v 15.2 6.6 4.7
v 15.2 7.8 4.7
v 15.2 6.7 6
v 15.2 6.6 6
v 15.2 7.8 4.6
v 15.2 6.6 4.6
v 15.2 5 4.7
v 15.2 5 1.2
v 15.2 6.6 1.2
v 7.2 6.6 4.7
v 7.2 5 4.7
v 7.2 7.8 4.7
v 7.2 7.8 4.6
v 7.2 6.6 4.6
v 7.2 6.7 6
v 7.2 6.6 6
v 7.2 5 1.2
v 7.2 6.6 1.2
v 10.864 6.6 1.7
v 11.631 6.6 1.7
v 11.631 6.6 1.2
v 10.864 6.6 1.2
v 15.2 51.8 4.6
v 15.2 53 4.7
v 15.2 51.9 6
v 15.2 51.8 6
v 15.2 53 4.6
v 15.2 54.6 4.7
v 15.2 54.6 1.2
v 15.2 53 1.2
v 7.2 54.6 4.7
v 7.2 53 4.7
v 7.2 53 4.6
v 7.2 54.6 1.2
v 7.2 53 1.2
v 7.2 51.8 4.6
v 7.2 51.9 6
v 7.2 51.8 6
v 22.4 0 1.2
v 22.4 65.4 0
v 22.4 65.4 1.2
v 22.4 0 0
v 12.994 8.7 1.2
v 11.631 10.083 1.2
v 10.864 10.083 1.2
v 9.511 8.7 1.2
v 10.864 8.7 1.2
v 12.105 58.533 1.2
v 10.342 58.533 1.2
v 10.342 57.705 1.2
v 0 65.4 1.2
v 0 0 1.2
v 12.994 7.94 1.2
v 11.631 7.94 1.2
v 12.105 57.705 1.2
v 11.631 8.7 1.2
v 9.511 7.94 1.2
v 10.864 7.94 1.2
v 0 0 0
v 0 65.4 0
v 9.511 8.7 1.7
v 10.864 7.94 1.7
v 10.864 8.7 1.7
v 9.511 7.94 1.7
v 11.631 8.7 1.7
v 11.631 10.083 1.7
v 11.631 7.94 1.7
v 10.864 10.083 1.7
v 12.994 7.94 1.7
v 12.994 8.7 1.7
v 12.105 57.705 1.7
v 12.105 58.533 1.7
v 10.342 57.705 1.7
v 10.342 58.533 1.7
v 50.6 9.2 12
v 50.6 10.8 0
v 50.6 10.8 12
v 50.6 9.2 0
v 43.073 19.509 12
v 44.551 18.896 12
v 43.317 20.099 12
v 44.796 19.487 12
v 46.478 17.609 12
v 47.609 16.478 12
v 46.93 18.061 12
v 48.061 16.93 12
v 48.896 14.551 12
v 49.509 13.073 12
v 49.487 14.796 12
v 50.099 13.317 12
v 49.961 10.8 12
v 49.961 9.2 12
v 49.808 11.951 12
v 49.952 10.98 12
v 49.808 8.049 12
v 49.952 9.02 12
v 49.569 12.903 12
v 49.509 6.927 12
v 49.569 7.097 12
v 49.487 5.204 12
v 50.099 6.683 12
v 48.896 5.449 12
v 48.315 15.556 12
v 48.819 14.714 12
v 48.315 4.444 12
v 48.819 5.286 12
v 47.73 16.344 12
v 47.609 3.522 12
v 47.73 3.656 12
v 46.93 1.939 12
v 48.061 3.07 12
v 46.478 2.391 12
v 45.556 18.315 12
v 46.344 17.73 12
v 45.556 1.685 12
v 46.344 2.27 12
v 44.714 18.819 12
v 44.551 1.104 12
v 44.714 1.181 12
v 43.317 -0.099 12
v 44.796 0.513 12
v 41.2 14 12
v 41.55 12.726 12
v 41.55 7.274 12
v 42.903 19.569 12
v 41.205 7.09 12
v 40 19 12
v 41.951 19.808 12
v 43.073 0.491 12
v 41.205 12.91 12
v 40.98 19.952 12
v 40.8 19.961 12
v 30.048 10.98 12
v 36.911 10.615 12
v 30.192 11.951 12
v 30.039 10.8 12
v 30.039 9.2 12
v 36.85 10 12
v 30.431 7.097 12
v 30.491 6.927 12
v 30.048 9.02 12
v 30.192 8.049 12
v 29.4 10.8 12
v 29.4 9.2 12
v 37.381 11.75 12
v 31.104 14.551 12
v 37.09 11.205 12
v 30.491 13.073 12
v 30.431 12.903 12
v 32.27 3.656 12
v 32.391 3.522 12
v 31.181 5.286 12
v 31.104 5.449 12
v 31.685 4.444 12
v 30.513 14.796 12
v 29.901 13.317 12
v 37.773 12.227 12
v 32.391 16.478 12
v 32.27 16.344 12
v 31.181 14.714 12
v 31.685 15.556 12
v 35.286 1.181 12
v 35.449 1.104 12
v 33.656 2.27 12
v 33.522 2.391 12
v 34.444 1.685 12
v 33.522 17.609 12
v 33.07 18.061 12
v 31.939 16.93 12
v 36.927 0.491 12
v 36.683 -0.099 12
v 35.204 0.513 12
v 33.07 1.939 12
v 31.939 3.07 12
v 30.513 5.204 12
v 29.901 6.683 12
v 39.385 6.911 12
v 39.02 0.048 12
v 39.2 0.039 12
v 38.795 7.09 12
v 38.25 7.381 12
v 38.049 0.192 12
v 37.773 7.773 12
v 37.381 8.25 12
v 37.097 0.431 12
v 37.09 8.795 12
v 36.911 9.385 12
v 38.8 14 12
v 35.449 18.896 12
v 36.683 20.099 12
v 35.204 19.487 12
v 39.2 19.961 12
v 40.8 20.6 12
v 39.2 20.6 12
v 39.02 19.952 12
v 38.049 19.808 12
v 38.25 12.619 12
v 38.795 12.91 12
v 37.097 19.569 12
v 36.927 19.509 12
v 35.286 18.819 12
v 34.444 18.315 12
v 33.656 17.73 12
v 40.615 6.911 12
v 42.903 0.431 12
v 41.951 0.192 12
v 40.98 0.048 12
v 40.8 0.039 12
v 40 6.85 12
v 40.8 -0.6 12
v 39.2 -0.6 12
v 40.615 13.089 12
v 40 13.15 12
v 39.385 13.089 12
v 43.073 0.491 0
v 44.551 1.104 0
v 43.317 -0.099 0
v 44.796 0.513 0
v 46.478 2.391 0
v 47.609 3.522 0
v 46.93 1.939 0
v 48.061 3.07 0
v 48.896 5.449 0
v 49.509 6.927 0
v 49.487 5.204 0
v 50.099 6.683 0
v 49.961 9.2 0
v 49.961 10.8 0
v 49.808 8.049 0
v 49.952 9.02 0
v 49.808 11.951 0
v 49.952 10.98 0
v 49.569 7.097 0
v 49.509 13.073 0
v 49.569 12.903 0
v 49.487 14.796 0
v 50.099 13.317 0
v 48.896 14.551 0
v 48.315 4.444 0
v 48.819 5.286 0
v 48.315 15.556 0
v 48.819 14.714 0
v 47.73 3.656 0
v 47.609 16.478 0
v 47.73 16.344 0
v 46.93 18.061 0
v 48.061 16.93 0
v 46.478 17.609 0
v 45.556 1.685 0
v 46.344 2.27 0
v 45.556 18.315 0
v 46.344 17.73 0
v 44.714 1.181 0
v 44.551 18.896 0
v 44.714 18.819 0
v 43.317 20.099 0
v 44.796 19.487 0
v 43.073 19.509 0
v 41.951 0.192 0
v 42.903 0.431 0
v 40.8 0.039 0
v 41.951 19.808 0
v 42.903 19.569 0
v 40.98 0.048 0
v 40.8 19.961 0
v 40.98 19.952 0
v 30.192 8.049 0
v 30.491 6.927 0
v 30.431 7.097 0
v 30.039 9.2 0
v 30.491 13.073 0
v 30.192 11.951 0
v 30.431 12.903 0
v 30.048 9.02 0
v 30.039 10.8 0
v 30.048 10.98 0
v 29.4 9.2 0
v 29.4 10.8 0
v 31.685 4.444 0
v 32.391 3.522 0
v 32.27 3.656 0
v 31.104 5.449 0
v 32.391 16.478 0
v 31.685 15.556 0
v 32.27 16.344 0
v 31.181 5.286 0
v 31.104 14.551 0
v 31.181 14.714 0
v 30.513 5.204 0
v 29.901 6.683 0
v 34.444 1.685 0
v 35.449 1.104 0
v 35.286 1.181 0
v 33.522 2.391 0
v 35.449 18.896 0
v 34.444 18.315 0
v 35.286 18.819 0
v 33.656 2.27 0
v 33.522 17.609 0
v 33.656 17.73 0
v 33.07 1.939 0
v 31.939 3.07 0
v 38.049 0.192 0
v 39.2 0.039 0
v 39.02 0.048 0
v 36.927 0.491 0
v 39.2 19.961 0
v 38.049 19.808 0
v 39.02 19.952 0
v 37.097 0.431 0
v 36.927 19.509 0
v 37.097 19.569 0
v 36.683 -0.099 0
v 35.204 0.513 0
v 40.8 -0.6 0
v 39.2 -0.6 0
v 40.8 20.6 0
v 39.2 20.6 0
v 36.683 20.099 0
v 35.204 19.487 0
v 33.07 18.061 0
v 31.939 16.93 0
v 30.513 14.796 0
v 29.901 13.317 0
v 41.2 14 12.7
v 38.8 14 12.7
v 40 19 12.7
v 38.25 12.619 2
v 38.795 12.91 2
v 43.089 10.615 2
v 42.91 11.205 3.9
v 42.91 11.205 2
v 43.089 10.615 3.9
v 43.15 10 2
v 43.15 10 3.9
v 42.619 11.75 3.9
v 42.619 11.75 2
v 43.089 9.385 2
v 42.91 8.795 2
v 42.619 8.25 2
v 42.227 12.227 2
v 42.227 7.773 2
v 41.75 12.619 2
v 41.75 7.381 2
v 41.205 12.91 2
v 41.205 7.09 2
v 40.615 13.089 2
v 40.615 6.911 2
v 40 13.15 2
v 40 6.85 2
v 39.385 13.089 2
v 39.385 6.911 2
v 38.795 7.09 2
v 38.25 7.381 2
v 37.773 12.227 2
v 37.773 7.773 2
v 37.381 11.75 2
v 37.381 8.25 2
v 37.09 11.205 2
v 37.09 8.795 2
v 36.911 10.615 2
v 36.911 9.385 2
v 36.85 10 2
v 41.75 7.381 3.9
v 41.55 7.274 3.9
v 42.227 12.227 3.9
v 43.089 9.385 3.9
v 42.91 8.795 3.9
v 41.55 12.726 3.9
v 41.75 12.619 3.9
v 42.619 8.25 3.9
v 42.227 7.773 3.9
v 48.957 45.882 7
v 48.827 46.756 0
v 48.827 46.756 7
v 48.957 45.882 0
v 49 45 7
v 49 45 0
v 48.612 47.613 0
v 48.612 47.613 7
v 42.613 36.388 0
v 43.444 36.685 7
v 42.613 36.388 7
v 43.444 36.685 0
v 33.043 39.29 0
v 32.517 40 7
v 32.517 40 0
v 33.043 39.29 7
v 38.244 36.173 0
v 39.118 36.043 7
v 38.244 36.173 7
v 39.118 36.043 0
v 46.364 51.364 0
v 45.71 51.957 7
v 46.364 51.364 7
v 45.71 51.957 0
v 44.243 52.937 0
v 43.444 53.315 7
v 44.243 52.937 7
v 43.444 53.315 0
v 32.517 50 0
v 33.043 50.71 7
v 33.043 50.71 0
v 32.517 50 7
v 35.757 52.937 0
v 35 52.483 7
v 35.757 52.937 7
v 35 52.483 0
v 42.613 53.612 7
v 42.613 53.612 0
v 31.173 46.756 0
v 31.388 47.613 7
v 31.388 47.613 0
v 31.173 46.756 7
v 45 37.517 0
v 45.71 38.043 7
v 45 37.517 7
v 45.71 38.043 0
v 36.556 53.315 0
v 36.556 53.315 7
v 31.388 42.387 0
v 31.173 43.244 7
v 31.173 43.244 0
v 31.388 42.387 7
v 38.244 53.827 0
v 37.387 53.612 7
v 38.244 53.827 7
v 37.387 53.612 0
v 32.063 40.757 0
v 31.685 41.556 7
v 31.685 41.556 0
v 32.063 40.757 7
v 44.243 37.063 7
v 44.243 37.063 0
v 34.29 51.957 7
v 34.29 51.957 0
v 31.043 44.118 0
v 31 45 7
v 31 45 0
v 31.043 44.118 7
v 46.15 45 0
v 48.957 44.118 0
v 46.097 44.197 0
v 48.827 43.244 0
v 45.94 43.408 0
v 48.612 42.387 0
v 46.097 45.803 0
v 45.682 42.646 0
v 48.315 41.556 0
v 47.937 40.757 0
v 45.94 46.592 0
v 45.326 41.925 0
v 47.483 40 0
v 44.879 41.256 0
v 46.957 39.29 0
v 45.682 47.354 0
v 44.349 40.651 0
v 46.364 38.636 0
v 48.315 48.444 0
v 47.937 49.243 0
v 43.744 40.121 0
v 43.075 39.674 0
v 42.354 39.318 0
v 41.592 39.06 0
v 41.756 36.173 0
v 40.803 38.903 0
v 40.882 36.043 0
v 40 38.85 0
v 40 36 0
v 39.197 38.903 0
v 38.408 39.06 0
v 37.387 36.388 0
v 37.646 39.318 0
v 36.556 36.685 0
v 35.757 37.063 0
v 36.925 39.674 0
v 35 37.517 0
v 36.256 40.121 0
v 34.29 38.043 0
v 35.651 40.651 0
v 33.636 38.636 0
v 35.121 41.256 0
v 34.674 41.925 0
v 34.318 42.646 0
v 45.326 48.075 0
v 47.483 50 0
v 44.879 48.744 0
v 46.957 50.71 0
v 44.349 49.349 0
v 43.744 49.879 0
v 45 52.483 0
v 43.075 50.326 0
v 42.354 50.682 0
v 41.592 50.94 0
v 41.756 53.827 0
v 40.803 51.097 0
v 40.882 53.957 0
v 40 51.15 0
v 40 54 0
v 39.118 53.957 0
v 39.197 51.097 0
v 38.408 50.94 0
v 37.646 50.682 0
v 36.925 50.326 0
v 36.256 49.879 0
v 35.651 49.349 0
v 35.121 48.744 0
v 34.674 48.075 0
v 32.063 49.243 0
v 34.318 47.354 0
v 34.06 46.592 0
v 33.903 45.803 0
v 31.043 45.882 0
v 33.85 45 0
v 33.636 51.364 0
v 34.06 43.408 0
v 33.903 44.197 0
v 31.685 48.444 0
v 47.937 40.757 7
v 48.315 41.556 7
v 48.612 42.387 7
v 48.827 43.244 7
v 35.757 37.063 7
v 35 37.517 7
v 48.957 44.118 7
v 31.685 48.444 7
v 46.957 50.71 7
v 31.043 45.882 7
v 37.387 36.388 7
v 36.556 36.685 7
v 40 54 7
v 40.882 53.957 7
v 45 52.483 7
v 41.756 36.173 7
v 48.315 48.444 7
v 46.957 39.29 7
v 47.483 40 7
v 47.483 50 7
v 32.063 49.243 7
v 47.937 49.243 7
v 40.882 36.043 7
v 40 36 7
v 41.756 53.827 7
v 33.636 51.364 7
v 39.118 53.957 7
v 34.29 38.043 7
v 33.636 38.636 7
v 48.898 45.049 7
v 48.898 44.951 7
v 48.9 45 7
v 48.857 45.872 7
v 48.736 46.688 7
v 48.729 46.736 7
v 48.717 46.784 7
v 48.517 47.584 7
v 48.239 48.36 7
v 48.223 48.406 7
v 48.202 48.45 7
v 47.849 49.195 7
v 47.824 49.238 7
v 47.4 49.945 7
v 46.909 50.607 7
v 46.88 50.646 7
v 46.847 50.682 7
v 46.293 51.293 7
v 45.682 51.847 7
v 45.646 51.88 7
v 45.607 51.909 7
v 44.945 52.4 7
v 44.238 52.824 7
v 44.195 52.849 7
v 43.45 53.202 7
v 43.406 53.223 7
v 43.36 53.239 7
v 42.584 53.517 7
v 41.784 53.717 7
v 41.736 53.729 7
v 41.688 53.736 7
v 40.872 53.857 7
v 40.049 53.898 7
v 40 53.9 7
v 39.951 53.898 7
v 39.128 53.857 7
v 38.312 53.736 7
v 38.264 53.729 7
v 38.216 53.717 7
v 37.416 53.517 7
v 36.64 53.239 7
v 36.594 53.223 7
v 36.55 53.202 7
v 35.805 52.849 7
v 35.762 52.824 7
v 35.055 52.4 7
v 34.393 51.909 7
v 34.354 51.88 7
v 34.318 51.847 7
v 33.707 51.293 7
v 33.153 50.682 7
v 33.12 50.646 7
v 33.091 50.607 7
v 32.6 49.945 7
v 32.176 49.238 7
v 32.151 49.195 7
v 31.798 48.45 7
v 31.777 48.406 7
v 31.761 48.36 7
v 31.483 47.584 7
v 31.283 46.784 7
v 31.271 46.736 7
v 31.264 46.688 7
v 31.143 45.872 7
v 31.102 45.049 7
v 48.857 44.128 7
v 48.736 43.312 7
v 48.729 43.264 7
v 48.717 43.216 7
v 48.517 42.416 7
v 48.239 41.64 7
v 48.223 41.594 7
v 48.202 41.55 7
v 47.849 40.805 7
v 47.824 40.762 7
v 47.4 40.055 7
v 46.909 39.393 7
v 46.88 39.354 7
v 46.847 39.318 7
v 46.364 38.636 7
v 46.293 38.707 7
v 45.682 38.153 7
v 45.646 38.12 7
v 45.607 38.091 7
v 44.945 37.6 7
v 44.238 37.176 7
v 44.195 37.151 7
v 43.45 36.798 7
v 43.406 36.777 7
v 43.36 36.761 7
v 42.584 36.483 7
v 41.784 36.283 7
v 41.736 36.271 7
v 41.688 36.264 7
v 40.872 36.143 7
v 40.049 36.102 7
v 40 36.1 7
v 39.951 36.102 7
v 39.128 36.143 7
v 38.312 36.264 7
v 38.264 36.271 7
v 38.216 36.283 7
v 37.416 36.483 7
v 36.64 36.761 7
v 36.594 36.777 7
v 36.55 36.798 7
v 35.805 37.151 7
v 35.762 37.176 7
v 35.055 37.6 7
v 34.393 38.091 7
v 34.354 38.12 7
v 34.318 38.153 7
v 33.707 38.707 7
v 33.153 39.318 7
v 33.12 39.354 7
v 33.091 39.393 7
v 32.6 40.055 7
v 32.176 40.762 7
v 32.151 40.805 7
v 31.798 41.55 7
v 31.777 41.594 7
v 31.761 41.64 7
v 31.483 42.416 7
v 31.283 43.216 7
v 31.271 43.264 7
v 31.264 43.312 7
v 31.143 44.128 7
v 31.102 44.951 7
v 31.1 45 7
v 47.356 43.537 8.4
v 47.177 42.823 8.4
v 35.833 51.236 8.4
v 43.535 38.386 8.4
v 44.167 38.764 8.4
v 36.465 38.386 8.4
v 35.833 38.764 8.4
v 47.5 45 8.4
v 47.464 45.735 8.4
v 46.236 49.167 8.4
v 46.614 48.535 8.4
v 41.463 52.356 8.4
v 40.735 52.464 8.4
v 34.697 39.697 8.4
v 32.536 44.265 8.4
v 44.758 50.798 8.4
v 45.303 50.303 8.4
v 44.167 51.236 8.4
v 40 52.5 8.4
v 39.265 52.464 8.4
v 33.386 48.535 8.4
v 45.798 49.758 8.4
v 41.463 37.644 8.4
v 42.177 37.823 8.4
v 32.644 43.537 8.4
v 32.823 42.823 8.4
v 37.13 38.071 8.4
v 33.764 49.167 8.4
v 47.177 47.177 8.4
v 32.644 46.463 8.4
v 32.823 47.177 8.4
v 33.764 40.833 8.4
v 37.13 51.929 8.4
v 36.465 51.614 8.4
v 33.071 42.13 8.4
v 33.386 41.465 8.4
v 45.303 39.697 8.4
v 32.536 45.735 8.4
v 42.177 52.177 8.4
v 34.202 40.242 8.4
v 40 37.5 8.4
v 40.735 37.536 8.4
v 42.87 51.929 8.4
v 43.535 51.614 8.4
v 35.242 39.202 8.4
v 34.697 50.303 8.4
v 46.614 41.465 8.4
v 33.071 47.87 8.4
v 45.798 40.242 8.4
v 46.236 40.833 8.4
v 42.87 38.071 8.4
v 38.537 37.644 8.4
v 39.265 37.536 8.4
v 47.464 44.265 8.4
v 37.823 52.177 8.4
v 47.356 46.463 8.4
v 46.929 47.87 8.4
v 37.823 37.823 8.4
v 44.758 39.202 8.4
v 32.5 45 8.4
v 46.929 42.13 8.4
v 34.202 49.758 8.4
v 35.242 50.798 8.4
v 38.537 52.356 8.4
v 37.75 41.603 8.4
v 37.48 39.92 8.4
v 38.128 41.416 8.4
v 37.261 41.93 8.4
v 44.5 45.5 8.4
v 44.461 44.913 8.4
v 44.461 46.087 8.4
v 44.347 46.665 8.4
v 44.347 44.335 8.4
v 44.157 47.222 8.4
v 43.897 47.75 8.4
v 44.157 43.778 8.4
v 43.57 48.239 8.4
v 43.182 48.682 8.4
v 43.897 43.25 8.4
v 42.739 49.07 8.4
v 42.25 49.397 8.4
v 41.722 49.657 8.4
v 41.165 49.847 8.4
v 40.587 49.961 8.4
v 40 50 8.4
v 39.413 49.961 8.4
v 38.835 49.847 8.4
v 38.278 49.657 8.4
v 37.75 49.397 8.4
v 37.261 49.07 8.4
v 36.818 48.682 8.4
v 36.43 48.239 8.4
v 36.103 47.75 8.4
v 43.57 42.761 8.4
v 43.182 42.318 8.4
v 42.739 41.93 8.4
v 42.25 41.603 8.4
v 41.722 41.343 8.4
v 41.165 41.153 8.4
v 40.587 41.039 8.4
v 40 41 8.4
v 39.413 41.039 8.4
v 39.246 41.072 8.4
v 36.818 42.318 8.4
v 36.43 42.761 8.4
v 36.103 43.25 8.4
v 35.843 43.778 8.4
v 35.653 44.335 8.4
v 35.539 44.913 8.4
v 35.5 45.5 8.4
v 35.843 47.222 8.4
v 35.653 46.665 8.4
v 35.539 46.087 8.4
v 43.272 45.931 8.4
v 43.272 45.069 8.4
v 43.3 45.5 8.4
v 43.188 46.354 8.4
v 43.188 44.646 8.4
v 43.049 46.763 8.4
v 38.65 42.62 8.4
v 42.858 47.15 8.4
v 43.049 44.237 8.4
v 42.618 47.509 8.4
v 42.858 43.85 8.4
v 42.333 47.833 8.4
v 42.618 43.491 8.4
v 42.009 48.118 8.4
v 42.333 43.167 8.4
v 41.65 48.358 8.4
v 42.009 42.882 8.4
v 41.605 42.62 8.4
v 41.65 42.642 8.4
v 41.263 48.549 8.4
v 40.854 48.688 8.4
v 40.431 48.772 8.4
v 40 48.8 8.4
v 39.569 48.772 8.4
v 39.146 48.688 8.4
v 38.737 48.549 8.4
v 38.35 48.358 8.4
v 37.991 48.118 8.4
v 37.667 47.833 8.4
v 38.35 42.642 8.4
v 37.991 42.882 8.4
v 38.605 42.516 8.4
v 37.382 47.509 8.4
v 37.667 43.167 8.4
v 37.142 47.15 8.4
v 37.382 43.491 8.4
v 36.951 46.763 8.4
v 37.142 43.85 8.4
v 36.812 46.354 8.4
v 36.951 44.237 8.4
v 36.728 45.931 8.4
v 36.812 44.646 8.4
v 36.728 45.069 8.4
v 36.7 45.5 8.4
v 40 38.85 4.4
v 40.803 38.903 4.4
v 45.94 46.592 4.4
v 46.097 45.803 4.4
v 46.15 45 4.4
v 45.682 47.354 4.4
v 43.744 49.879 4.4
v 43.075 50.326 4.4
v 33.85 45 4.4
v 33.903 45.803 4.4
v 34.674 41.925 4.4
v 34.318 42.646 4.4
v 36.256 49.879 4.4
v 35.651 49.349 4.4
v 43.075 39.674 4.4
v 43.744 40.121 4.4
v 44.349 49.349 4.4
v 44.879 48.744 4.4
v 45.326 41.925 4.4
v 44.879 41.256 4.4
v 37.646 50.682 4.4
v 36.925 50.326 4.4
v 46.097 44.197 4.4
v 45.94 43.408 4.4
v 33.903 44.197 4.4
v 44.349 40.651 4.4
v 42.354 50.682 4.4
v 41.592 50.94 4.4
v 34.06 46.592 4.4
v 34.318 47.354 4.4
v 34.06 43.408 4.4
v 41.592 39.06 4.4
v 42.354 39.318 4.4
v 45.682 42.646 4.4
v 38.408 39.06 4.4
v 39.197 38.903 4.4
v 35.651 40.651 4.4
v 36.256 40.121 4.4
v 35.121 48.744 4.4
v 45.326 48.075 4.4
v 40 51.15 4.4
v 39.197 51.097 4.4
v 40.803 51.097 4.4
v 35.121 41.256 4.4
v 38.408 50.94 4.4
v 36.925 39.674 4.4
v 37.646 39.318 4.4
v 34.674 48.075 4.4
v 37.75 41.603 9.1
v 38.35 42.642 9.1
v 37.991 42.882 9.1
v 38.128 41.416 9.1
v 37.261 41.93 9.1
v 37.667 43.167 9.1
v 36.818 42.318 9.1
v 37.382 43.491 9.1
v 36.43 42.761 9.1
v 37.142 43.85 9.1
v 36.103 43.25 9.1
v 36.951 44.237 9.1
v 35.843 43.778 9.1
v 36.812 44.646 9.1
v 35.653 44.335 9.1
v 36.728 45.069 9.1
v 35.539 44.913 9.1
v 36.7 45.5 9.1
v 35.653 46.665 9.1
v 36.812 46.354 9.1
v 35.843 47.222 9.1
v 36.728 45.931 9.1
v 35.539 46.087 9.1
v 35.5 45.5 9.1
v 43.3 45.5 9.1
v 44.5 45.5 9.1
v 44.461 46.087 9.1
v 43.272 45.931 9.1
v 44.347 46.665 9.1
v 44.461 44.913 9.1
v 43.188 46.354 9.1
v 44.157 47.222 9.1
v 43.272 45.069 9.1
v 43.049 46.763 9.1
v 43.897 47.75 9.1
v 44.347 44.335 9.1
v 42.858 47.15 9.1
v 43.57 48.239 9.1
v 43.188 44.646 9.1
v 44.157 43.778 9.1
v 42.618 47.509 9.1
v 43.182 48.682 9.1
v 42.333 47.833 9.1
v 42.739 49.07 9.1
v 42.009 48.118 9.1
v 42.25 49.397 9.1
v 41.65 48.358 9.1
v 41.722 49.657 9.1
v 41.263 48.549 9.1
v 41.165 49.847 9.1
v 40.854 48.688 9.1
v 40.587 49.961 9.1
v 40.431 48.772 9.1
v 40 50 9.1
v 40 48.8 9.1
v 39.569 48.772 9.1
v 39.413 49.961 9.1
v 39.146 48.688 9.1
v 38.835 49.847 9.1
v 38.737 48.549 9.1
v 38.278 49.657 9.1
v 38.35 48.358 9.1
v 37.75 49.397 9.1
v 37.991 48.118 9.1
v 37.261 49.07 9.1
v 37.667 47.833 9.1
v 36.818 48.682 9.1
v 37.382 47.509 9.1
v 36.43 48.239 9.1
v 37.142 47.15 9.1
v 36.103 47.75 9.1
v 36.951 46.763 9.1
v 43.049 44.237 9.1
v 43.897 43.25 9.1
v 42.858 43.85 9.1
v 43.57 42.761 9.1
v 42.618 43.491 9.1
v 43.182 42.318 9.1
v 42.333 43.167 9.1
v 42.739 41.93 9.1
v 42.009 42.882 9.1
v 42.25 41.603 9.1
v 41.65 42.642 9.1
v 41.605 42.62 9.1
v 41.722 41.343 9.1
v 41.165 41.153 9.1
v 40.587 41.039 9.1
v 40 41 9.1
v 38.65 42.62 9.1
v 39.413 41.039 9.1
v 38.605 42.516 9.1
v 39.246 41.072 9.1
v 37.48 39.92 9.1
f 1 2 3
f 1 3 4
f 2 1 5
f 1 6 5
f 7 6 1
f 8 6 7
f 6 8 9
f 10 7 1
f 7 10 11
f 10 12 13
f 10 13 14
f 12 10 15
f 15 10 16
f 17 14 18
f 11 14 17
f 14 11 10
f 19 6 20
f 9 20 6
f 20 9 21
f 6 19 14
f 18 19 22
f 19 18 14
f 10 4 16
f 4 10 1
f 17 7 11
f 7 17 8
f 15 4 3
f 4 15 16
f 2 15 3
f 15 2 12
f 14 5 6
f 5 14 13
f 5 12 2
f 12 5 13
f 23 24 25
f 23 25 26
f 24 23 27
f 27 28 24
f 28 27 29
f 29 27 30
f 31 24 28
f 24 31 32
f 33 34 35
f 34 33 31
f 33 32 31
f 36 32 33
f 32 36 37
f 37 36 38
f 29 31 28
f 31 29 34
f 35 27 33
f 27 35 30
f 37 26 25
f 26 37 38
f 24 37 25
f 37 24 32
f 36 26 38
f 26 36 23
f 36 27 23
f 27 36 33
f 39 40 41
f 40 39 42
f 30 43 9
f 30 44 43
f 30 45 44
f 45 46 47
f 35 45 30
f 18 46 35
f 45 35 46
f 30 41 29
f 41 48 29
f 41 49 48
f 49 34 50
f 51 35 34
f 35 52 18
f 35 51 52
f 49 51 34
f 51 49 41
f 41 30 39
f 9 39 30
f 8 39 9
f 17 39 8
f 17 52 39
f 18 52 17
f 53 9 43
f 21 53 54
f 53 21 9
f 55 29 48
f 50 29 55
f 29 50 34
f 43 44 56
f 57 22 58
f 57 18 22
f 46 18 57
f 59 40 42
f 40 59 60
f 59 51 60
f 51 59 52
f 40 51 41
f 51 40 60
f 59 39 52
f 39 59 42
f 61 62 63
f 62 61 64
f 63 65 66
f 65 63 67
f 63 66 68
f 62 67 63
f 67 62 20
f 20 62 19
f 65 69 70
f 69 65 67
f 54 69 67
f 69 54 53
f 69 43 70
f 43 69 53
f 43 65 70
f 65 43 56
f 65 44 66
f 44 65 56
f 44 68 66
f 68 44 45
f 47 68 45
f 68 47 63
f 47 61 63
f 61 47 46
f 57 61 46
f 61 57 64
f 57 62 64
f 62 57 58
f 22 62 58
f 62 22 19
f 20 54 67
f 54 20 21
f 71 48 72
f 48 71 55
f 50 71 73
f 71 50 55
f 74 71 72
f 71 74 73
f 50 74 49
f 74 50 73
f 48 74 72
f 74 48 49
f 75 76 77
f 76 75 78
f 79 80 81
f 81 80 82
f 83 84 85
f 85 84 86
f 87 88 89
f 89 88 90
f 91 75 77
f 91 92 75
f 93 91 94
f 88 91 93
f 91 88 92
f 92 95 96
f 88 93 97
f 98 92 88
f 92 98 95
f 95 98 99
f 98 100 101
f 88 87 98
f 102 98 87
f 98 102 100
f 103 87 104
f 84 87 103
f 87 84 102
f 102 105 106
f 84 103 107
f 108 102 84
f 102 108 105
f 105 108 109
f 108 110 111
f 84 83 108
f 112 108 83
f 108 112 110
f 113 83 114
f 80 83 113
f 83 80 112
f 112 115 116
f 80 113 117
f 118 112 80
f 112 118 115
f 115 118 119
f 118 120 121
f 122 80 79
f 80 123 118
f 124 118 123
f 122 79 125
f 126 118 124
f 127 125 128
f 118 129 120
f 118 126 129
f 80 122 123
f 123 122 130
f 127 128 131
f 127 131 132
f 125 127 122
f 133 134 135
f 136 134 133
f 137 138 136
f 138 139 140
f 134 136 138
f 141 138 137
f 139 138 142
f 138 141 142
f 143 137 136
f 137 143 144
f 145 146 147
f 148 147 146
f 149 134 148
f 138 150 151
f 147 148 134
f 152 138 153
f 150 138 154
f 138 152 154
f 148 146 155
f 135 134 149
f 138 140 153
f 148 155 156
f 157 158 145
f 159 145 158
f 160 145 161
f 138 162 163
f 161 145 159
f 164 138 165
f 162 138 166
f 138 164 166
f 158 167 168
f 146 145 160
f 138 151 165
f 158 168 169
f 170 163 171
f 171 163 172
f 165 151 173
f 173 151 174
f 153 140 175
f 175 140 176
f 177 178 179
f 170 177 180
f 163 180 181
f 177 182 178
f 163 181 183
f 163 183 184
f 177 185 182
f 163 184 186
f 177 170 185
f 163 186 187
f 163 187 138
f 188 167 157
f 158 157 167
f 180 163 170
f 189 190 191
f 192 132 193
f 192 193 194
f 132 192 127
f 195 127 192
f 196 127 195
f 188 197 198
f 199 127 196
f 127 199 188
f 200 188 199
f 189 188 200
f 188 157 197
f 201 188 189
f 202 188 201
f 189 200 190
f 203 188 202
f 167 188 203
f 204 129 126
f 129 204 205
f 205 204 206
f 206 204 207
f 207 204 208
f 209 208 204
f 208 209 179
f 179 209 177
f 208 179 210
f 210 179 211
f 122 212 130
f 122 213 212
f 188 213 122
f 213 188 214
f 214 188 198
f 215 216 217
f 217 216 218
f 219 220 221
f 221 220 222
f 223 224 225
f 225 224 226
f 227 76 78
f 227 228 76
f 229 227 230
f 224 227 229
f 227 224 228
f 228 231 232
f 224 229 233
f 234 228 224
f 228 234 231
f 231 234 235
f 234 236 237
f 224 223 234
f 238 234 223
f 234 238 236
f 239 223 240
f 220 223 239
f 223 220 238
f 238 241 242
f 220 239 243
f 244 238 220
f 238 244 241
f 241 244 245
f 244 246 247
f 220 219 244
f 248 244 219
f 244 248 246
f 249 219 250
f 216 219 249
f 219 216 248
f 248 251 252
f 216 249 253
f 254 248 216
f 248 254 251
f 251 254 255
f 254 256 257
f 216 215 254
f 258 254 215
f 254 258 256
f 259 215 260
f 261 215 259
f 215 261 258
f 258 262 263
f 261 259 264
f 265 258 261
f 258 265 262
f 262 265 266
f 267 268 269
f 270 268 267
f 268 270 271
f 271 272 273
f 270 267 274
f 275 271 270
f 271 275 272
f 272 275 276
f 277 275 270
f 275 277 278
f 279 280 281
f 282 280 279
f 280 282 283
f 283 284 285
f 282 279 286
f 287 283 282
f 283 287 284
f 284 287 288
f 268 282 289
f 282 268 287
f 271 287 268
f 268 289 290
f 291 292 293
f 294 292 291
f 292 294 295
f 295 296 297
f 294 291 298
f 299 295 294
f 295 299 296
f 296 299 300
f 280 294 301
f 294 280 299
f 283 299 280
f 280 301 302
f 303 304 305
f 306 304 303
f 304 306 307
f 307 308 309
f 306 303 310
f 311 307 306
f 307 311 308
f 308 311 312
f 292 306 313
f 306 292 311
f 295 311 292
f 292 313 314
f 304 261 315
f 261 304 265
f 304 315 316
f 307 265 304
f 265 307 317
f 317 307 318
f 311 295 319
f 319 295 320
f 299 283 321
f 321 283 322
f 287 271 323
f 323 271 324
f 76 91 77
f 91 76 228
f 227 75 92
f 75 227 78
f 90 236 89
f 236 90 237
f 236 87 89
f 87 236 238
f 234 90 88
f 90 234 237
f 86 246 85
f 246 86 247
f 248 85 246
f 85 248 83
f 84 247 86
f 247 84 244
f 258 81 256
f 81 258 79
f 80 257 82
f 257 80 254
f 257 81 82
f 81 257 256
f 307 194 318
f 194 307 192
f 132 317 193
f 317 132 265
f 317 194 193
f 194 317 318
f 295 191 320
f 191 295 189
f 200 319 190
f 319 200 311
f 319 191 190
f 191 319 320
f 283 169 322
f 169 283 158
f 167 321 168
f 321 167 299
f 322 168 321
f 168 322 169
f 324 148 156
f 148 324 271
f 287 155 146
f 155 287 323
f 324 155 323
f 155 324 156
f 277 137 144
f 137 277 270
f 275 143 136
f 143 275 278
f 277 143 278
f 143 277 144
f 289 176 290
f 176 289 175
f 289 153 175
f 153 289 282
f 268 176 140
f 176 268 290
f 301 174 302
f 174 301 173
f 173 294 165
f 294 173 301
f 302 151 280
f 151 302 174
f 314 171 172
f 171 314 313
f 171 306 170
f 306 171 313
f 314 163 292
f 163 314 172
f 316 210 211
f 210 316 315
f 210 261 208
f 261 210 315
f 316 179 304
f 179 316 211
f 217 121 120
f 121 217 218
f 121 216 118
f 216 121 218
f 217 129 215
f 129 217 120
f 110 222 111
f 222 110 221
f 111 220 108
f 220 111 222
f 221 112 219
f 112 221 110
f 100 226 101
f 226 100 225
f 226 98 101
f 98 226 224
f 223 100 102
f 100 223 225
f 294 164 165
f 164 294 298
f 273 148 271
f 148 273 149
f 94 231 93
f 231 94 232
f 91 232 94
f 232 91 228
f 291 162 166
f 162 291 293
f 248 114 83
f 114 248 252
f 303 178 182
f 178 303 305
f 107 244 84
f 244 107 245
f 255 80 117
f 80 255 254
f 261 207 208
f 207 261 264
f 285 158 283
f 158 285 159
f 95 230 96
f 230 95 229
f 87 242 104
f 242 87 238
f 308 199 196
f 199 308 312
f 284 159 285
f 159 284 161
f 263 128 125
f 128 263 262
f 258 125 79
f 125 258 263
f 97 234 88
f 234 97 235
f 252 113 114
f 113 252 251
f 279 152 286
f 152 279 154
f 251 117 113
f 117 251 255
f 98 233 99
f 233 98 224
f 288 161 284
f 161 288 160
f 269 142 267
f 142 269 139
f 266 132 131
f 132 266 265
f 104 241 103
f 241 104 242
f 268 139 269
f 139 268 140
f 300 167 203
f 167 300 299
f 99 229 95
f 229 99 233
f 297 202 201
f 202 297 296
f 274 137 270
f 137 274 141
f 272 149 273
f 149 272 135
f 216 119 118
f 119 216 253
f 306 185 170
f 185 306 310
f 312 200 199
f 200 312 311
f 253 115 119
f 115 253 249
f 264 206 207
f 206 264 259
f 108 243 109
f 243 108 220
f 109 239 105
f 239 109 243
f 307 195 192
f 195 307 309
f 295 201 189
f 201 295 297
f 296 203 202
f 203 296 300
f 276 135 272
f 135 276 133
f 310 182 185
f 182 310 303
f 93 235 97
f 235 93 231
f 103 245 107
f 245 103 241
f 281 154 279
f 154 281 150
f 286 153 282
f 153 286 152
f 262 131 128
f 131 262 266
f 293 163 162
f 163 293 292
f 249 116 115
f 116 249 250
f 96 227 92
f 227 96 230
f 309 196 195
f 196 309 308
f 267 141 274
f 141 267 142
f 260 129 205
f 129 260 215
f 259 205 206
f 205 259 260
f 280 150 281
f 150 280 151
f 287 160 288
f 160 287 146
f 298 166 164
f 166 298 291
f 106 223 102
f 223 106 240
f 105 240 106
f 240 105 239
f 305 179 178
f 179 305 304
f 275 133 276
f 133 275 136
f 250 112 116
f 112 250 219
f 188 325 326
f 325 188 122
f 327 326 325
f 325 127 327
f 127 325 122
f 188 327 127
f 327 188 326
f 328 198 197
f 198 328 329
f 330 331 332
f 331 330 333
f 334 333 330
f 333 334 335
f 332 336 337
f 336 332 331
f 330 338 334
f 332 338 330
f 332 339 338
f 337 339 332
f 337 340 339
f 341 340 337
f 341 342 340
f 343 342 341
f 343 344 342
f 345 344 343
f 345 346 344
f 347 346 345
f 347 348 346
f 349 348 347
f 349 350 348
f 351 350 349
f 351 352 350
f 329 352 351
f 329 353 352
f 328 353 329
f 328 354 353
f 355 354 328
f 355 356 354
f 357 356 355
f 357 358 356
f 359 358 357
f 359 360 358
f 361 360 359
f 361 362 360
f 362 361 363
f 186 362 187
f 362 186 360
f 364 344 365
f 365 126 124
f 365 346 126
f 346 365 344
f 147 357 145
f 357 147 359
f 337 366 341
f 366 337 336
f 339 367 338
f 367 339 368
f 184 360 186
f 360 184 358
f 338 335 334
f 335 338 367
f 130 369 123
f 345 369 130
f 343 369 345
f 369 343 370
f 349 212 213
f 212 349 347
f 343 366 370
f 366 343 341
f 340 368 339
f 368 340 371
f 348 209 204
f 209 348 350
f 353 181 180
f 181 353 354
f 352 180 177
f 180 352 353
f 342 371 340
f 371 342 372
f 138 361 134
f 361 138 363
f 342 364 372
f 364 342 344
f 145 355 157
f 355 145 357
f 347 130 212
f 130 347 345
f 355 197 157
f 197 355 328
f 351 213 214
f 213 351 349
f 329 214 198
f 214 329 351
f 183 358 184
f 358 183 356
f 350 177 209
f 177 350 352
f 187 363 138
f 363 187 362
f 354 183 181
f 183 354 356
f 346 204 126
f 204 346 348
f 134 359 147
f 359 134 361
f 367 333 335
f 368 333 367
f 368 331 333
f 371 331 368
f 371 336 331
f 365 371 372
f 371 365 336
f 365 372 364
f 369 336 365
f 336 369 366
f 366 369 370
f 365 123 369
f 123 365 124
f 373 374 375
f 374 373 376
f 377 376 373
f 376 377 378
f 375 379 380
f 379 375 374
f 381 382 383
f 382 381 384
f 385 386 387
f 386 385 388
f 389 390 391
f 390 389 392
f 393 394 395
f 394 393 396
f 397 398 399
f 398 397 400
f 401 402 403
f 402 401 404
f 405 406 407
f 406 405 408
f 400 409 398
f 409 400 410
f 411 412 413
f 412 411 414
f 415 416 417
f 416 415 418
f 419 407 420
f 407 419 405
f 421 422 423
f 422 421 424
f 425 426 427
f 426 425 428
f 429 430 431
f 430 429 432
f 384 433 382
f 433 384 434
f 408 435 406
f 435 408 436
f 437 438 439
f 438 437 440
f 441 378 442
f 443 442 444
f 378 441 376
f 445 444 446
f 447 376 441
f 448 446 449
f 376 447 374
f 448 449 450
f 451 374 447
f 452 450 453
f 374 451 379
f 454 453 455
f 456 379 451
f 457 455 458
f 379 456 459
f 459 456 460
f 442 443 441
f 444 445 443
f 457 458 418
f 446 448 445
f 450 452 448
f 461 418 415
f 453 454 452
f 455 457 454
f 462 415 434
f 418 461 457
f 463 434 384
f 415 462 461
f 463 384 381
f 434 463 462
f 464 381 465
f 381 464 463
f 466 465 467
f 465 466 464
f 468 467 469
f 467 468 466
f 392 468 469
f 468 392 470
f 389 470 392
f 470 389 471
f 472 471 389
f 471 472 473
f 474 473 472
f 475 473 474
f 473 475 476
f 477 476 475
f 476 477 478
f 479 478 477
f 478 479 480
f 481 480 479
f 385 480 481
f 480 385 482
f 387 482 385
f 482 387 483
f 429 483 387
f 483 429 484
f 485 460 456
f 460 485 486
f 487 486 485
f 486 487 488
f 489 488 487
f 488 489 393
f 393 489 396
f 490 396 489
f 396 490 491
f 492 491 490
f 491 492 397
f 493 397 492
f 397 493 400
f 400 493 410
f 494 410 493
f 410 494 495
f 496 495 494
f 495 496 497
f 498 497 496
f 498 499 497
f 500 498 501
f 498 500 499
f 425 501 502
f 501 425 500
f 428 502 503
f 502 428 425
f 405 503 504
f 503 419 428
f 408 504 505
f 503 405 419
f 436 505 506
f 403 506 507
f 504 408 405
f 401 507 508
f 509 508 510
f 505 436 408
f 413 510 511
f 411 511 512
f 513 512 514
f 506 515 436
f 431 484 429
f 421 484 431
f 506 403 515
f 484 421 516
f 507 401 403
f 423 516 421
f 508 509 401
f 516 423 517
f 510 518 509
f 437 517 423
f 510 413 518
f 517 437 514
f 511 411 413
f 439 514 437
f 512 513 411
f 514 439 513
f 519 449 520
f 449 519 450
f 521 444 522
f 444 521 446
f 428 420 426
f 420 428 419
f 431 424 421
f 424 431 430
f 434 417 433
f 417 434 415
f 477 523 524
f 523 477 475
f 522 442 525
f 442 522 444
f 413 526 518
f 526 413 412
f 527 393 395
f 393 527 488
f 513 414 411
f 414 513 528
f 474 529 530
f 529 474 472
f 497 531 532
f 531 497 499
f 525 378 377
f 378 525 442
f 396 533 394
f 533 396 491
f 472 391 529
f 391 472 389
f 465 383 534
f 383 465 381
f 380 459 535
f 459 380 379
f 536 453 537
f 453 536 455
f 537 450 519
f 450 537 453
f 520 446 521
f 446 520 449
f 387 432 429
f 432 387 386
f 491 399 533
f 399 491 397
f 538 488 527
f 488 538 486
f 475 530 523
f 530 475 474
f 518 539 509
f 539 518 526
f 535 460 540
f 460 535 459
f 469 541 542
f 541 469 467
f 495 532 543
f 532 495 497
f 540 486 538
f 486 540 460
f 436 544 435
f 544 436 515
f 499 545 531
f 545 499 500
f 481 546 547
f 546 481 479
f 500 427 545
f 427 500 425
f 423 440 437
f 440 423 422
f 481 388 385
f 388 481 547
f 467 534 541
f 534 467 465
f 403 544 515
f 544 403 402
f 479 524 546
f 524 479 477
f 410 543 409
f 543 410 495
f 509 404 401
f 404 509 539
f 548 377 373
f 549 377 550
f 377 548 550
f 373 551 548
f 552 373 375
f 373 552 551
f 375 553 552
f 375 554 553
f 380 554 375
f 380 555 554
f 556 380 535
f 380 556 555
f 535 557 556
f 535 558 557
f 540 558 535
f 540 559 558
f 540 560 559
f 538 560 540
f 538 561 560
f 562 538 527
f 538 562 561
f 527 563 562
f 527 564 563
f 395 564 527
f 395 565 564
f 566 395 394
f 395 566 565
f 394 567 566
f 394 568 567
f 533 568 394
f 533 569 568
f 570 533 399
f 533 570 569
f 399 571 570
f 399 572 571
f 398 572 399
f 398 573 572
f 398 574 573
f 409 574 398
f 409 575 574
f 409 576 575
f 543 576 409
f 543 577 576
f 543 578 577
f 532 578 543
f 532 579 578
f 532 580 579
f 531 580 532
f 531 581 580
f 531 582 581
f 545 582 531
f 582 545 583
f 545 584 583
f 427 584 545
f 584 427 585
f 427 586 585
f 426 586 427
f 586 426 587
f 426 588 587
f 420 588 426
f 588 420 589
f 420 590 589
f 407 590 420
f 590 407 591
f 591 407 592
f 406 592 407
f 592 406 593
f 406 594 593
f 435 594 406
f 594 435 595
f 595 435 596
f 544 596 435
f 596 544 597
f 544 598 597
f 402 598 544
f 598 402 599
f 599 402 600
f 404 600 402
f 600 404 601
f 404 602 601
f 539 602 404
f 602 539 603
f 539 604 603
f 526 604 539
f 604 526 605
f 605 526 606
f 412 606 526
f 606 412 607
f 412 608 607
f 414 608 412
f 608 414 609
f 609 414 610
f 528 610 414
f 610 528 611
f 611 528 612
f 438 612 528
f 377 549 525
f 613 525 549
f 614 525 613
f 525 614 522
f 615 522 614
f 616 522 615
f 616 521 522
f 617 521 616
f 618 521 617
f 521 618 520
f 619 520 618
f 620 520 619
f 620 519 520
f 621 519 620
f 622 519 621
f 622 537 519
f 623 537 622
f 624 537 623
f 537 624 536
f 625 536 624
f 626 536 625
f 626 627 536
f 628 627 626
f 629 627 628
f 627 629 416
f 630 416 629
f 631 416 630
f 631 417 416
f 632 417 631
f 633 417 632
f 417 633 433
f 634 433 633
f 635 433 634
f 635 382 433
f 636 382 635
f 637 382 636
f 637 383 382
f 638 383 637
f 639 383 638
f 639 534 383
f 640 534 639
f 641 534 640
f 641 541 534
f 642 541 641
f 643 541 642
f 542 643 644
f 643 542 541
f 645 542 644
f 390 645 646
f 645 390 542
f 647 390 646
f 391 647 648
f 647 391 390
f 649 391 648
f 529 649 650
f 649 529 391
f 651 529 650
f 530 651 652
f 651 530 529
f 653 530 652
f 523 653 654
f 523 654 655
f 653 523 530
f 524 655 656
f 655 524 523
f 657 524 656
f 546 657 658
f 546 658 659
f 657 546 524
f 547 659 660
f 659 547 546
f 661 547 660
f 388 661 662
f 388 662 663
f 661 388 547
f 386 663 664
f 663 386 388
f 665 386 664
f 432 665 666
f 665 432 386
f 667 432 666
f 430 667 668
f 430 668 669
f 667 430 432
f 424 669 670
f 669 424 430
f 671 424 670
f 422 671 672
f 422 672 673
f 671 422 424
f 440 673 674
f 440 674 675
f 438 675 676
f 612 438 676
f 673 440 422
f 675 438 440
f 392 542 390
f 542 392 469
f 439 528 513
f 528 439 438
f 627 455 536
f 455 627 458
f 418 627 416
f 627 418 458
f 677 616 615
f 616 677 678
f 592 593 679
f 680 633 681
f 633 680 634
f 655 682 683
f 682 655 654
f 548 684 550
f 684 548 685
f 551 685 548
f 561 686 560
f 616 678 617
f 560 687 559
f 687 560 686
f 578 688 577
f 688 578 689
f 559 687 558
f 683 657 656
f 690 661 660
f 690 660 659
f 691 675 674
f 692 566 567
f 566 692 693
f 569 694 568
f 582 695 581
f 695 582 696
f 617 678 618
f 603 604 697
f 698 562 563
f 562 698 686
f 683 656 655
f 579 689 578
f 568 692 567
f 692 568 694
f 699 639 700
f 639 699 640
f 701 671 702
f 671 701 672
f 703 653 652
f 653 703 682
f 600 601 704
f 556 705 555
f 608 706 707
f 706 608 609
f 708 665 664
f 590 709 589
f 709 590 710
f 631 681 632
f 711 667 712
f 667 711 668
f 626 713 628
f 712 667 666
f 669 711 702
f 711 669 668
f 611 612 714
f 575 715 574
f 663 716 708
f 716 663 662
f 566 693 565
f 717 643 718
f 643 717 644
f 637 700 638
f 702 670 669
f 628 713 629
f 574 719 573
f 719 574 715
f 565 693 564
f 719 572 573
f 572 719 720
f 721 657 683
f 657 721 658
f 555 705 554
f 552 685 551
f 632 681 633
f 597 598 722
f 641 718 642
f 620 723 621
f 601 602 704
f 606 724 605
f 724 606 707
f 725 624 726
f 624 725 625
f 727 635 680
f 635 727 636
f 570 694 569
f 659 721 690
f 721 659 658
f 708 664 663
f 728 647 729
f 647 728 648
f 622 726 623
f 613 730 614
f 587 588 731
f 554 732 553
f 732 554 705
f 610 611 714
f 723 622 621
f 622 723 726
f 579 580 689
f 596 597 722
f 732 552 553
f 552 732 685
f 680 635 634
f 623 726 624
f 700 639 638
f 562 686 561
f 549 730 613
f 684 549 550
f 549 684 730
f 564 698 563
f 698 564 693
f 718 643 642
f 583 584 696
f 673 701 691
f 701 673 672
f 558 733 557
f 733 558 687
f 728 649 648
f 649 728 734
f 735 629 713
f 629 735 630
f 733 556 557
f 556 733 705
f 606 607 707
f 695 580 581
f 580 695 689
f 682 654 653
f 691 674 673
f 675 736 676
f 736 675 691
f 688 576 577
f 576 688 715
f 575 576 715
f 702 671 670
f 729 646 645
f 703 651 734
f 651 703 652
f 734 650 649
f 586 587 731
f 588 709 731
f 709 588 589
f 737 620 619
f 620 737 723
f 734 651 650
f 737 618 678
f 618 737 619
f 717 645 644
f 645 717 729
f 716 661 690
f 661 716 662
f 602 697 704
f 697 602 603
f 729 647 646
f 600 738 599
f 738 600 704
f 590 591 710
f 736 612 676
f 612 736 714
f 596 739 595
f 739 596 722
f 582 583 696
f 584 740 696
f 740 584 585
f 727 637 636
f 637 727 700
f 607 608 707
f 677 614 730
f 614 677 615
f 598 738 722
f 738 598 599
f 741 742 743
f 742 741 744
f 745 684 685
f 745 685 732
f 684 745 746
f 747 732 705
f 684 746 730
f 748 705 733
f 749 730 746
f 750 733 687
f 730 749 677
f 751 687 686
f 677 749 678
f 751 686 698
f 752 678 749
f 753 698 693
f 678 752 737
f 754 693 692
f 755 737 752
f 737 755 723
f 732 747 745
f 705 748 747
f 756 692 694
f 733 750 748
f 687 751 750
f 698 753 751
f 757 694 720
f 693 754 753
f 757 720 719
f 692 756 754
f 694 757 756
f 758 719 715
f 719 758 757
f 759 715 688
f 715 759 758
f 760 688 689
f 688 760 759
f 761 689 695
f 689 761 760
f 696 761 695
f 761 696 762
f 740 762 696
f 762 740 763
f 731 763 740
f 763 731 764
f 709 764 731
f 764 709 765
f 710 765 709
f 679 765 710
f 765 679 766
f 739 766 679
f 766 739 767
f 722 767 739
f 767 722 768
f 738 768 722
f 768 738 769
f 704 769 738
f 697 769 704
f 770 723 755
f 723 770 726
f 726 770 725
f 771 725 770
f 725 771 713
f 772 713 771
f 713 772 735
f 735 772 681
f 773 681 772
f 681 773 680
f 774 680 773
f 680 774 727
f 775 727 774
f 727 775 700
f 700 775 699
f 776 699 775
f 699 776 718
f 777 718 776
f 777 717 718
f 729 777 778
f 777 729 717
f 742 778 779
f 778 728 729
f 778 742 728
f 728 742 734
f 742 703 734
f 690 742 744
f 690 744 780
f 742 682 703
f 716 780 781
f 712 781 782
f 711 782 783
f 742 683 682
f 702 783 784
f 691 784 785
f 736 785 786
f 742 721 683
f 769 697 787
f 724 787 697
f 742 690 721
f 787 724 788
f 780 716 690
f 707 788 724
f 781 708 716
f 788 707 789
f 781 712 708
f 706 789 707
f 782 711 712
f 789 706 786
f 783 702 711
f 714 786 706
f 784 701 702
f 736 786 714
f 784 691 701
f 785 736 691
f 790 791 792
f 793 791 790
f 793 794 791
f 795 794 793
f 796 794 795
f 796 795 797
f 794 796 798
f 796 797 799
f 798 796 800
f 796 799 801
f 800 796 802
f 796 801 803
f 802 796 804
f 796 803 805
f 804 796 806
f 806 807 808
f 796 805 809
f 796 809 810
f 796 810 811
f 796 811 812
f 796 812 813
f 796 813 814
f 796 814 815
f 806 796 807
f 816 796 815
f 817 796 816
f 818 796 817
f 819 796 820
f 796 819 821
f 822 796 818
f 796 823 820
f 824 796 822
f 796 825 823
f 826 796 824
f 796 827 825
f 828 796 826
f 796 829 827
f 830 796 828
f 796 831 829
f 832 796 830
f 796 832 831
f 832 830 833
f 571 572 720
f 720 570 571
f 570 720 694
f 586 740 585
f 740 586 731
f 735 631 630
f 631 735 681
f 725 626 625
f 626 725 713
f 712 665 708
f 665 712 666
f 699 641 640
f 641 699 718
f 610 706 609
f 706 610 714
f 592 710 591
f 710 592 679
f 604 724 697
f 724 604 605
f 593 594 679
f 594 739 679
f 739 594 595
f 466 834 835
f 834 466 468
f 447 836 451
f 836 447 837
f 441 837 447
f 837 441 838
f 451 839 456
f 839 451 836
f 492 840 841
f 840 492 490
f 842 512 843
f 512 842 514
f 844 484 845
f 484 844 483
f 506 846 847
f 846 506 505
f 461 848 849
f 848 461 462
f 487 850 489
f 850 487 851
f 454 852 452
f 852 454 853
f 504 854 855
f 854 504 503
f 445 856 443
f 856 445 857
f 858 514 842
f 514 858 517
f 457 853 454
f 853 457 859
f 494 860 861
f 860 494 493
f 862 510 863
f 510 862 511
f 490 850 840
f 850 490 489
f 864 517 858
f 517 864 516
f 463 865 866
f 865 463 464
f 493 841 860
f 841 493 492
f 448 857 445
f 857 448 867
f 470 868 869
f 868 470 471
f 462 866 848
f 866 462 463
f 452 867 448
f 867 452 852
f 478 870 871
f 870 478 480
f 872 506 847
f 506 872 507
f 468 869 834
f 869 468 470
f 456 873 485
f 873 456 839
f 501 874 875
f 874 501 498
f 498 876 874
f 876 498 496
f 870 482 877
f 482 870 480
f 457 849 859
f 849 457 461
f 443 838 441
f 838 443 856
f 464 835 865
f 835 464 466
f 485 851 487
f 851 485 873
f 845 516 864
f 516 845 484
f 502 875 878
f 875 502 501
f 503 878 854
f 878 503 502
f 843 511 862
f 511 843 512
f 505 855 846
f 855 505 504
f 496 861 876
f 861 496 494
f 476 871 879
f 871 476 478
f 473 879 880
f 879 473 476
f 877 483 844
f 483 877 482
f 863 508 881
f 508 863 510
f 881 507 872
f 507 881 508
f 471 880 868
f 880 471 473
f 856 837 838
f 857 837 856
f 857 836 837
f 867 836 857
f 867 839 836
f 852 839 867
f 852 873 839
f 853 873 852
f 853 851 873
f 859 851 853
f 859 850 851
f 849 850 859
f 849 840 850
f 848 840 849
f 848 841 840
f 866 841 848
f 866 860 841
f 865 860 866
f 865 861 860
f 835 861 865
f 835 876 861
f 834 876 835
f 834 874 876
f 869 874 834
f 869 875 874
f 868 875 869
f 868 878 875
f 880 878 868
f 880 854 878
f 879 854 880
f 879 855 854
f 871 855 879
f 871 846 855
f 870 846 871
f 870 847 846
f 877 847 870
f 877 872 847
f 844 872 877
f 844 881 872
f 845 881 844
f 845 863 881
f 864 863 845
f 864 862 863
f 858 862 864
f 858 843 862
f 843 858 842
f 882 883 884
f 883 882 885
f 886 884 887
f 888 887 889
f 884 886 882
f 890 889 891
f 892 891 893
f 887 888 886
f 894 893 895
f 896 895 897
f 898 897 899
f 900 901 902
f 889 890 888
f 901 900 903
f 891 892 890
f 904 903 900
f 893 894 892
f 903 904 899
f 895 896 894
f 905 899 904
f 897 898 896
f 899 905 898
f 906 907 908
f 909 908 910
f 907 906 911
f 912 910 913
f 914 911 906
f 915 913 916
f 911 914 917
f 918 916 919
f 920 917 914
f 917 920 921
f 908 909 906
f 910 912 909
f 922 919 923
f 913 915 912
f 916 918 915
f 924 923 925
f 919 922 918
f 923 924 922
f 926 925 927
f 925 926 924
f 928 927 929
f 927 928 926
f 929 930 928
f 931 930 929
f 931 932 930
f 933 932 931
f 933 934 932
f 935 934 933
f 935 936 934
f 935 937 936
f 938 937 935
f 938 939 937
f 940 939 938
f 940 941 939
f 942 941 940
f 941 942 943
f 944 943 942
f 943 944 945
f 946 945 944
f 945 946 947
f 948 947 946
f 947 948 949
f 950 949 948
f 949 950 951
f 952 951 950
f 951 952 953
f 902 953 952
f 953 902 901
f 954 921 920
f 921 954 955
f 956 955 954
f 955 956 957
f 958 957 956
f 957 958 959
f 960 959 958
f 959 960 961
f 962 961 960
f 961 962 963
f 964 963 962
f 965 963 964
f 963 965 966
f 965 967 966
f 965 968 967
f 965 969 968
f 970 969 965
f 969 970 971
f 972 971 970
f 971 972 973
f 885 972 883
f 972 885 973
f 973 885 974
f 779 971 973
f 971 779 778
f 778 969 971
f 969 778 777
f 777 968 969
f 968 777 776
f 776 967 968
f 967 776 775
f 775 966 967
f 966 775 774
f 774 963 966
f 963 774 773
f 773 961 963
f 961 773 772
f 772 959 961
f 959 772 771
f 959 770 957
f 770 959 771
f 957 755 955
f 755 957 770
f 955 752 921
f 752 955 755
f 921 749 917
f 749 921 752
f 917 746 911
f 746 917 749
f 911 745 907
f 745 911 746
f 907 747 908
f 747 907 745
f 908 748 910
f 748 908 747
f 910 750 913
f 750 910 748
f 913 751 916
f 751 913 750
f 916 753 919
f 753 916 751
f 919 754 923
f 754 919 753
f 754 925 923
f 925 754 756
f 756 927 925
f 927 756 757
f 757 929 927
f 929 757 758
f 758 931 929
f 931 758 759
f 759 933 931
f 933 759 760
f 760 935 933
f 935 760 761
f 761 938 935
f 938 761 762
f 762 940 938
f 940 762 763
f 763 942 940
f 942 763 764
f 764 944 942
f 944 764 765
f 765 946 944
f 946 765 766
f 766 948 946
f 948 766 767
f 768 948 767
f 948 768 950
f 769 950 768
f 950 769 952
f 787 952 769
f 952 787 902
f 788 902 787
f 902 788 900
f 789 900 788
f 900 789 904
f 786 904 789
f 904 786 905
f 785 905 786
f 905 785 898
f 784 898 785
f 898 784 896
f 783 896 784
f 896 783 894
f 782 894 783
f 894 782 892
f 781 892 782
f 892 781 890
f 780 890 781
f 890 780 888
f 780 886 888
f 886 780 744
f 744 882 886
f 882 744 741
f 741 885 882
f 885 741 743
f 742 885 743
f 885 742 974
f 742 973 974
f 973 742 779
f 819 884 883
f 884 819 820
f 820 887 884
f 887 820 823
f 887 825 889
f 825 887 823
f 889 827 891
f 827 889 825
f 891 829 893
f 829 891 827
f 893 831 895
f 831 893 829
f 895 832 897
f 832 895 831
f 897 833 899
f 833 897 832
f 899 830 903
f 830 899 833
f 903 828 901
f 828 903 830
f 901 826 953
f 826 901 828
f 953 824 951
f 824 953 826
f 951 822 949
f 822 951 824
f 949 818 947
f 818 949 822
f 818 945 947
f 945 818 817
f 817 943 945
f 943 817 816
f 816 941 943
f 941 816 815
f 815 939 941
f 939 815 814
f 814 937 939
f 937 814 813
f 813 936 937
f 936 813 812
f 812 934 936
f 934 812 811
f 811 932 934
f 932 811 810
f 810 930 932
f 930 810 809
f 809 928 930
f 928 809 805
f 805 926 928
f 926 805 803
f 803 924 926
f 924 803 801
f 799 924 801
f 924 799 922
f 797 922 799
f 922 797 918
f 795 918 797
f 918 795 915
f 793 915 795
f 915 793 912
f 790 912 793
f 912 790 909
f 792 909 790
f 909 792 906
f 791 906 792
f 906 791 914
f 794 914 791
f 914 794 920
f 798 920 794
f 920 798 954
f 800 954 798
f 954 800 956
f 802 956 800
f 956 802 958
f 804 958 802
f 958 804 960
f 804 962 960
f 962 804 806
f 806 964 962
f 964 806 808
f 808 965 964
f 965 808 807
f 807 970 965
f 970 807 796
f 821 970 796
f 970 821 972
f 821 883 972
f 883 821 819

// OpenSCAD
// Arquivo auxiliar para exportar a TAMPA DA BATERIA + peças miúdas
// (knob do potenciômetro e adaptador do botão FALAR) como STL.
// Abra no OpenSCAD > F6 (Render) > File > Export as STL
//
// Todas as peças imprimem deitadas, SEM suporte:
//   - Tampa da bateria: clipes cantilever chanfrados para cima
//   - Knob Ø20 estriado: furo D-shaft 6mm para cima
//   - Adaptador FALAR Ø18: cúpula para cima
//
// Dica: imprima o knob e o adaptador com 4 perímetros (mais rígidos).

include <case_voz_autista_v3.scad>

render_base         = false;
render_lid          = false;
render_battery_door = false;
render_knob         = false;
render_falar_cap    = false;
explode = 0;

// Tampa da bateria deitada na mesa
battery_door();

// Knob ao lado
translate([40, 10, 0]) pot_knob();

// Adaptador do FALAR ao lado
translate([40, 45, 0]) falar_cap();
